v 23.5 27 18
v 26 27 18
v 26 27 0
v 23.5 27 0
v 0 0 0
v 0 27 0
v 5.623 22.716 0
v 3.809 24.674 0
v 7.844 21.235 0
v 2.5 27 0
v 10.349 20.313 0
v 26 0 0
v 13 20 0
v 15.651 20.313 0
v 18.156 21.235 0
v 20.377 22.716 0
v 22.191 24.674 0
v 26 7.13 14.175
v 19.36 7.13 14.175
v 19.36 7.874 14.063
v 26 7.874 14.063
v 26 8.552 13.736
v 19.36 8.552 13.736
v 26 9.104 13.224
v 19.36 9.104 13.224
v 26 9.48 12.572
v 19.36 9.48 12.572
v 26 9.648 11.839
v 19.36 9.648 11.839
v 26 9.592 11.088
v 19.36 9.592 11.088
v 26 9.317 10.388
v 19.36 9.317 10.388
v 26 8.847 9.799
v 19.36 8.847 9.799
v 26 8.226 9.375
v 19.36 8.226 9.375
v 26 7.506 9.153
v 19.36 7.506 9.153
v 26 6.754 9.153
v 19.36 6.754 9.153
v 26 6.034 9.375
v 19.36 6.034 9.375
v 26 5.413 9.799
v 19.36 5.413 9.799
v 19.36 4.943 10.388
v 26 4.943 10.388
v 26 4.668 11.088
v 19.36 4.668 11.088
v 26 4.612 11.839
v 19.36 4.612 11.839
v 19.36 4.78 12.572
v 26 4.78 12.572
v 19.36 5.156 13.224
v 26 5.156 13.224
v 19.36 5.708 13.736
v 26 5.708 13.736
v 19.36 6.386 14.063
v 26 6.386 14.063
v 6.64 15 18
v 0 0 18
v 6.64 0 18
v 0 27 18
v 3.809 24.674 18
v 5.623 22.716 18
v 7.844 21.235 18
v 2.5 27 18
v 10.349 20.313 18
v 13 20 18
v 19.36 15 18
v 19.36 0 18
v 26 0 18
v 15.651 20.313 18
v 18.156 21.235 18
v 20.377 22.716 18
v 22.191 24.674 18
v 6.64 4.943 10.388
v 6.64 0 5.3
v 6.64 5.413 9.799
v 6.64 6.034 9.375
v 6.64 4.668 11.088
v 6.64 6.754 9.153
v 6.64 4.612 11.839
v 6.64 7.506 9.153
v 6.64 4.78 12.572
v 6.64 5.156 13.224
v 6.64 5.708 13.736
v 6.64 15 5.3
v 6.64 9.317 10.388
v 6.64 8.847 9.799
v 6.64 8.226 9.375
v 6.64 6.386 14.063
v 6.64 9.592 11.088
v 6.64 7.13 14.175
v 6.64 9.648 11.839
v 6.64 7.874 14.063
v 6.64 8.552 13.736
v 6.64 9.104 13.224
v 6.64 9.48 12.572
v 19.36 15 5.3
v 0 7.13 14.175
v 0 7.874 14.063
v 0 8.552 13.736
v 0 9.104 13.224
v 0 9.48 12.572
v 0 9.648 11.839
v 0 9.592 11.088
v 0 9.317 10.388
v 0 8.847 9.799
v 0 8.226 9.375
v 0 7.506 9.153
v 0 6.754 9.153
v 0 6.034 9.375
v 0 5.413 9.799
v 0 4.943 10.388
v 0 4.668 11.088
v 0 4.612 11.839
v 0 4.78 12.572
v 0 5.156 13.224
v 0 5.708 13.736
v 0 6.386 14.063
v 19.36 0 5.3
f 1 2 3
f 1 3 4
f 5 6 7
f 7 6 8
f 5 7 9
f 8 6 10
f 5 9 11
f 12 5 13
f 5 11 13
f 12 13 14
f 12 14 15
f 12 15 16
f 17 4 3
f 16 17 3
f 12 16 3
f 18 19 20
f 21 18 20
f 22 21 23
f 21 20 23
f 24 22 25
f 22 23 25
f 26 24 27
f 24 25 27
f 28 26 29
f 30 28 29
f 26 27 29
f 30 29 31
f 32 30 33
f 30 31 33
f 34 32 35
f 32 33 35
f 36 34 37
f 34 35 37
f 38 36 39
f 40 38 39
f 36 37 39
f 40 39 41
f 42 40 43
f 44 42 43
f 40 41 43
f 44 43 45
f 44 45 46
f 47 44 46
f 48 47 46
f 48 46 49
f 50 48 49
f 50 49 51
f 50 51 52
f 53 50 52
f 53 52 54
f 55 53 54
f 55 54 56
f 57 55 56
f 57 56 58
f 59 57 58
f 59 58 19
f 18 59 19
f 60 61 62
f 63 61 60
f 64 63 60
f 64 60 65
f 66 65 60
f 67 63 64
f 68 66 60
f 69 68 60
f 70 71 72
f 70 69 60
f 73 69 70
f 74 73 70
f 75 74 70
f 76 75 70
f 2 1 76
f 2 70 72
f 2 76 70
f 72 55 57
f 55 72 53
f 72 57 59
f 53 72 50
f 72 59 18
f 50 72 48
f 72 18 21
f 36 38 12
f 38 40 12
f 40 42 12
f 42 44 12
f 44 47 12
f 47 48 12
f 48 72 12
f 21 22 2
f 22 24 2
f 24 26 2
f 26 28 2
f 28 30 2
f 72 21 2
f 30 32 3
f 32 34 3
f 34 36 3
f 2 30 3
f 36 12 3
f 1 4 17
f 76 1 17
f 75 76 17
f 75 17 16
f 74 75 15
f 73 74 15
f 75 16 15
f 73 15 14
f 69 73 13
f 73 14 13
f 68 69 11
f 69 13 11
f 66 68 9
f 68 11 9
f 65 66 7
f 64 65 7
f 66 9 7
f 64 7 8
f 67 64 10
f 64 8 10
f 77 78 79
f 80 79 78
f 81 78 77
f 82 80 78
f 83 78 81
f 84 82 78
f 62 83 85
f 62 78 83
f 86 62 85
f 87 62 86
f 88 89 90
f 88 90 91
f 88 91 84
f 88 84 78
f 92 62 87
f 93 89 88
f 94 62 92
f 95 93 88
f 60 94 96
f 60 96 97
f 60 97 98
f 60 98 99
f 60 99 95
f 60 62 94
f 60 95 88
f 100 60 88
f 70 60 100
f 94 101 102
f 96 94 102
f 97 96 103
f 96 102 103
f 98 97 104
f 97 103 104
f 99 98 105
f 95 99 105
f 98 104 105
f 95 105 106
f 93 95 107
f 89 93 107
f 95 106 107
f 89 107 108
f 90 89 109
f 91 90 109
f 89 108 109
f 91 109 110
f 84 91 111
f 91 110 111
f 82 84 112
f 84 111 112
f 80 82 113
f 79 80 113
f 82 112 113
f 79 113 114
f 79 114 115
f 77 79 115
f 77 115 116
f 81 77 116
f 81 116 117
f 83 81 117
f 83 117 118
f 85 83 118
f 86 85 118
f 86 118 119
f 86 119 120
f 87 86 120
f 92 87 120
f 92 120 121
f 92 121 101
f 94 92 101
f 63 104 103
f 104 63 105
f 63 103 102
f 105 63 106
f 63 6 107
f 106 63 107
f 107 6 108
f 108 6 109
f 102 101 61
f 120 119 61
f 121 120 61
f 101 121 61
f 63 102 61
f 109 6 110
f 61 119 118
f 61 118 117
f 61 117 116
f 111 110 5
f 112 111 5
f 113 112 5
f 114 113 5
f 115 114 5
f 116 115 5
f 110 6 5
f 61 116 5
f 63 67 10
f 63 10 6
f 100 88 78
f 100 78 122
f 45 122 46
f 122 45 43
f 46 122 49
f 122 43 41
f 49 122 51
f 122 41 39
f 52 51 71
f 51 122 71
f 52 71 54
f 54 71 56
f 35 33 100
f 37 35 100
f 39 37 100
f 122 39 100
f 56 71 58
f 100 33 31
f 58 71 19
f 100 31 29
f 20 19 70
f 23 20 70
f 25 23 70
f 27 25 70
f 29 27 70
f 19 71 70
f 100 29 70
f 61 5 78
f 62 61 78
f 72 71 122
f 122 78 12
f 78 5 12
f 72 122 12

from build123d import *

# Parameters (mm, degrees)
BOSS_EXTRU_1_DEPTH      = 18
ESQUISSE2_W             = 12.72
ESQUISSE2_H             = 15
ENL_V_MAT_EXTRU_1_DEPTH = 12.7
ESQUISSE3_R             = 2.525
ENL_V_MAT_EXTRU_2_DEPTH = 27


with BuildPart() as part:
    # Esquisse1 → Boss.-Extru.1 (new body)
    with BuildSketch(Plane.XY):
        with BuildLine():
            Line((0, 0), (26, 0))
            Line((26, 0), (26, 27))
            Line((26, 27), (23.5, 27))
            ThreePointArc((23.5, 27), (13, 20), (2.5, 27))
            Line((2.5, 27), (0, 27))
            Line((0, 27), (0, 0))
        make_face()
    extrude(amount=BOSS_EXTRU_1_DEPTH)

    # Esquisse2 → Enlèv. mat.-Extru.1 (cut)
    with BuildSketch(Plane.XY.offset(18)):
        with Locations((13, 7.5)):
            Rectangle(ESQUISSE2_W, ESQUISSE2_H)
    extrude(amount=-ENL_V_MAT_EXTRU_1_DEPTH, mode=Mode.SUBTRACT)

    # Esquisse3 → Enlèv. mat.-Extru.2 (cut, through all)
    with BuildSketch(Plane.ZY):
        with Locations((11.65, 7.13)):
            Circle(ESQUISSE3_R)
    extrude(amount=-ENL_V_MAT_EXTRU_2_DEPTH, mode=Mode.SUBTRACT)


solid = part.part
